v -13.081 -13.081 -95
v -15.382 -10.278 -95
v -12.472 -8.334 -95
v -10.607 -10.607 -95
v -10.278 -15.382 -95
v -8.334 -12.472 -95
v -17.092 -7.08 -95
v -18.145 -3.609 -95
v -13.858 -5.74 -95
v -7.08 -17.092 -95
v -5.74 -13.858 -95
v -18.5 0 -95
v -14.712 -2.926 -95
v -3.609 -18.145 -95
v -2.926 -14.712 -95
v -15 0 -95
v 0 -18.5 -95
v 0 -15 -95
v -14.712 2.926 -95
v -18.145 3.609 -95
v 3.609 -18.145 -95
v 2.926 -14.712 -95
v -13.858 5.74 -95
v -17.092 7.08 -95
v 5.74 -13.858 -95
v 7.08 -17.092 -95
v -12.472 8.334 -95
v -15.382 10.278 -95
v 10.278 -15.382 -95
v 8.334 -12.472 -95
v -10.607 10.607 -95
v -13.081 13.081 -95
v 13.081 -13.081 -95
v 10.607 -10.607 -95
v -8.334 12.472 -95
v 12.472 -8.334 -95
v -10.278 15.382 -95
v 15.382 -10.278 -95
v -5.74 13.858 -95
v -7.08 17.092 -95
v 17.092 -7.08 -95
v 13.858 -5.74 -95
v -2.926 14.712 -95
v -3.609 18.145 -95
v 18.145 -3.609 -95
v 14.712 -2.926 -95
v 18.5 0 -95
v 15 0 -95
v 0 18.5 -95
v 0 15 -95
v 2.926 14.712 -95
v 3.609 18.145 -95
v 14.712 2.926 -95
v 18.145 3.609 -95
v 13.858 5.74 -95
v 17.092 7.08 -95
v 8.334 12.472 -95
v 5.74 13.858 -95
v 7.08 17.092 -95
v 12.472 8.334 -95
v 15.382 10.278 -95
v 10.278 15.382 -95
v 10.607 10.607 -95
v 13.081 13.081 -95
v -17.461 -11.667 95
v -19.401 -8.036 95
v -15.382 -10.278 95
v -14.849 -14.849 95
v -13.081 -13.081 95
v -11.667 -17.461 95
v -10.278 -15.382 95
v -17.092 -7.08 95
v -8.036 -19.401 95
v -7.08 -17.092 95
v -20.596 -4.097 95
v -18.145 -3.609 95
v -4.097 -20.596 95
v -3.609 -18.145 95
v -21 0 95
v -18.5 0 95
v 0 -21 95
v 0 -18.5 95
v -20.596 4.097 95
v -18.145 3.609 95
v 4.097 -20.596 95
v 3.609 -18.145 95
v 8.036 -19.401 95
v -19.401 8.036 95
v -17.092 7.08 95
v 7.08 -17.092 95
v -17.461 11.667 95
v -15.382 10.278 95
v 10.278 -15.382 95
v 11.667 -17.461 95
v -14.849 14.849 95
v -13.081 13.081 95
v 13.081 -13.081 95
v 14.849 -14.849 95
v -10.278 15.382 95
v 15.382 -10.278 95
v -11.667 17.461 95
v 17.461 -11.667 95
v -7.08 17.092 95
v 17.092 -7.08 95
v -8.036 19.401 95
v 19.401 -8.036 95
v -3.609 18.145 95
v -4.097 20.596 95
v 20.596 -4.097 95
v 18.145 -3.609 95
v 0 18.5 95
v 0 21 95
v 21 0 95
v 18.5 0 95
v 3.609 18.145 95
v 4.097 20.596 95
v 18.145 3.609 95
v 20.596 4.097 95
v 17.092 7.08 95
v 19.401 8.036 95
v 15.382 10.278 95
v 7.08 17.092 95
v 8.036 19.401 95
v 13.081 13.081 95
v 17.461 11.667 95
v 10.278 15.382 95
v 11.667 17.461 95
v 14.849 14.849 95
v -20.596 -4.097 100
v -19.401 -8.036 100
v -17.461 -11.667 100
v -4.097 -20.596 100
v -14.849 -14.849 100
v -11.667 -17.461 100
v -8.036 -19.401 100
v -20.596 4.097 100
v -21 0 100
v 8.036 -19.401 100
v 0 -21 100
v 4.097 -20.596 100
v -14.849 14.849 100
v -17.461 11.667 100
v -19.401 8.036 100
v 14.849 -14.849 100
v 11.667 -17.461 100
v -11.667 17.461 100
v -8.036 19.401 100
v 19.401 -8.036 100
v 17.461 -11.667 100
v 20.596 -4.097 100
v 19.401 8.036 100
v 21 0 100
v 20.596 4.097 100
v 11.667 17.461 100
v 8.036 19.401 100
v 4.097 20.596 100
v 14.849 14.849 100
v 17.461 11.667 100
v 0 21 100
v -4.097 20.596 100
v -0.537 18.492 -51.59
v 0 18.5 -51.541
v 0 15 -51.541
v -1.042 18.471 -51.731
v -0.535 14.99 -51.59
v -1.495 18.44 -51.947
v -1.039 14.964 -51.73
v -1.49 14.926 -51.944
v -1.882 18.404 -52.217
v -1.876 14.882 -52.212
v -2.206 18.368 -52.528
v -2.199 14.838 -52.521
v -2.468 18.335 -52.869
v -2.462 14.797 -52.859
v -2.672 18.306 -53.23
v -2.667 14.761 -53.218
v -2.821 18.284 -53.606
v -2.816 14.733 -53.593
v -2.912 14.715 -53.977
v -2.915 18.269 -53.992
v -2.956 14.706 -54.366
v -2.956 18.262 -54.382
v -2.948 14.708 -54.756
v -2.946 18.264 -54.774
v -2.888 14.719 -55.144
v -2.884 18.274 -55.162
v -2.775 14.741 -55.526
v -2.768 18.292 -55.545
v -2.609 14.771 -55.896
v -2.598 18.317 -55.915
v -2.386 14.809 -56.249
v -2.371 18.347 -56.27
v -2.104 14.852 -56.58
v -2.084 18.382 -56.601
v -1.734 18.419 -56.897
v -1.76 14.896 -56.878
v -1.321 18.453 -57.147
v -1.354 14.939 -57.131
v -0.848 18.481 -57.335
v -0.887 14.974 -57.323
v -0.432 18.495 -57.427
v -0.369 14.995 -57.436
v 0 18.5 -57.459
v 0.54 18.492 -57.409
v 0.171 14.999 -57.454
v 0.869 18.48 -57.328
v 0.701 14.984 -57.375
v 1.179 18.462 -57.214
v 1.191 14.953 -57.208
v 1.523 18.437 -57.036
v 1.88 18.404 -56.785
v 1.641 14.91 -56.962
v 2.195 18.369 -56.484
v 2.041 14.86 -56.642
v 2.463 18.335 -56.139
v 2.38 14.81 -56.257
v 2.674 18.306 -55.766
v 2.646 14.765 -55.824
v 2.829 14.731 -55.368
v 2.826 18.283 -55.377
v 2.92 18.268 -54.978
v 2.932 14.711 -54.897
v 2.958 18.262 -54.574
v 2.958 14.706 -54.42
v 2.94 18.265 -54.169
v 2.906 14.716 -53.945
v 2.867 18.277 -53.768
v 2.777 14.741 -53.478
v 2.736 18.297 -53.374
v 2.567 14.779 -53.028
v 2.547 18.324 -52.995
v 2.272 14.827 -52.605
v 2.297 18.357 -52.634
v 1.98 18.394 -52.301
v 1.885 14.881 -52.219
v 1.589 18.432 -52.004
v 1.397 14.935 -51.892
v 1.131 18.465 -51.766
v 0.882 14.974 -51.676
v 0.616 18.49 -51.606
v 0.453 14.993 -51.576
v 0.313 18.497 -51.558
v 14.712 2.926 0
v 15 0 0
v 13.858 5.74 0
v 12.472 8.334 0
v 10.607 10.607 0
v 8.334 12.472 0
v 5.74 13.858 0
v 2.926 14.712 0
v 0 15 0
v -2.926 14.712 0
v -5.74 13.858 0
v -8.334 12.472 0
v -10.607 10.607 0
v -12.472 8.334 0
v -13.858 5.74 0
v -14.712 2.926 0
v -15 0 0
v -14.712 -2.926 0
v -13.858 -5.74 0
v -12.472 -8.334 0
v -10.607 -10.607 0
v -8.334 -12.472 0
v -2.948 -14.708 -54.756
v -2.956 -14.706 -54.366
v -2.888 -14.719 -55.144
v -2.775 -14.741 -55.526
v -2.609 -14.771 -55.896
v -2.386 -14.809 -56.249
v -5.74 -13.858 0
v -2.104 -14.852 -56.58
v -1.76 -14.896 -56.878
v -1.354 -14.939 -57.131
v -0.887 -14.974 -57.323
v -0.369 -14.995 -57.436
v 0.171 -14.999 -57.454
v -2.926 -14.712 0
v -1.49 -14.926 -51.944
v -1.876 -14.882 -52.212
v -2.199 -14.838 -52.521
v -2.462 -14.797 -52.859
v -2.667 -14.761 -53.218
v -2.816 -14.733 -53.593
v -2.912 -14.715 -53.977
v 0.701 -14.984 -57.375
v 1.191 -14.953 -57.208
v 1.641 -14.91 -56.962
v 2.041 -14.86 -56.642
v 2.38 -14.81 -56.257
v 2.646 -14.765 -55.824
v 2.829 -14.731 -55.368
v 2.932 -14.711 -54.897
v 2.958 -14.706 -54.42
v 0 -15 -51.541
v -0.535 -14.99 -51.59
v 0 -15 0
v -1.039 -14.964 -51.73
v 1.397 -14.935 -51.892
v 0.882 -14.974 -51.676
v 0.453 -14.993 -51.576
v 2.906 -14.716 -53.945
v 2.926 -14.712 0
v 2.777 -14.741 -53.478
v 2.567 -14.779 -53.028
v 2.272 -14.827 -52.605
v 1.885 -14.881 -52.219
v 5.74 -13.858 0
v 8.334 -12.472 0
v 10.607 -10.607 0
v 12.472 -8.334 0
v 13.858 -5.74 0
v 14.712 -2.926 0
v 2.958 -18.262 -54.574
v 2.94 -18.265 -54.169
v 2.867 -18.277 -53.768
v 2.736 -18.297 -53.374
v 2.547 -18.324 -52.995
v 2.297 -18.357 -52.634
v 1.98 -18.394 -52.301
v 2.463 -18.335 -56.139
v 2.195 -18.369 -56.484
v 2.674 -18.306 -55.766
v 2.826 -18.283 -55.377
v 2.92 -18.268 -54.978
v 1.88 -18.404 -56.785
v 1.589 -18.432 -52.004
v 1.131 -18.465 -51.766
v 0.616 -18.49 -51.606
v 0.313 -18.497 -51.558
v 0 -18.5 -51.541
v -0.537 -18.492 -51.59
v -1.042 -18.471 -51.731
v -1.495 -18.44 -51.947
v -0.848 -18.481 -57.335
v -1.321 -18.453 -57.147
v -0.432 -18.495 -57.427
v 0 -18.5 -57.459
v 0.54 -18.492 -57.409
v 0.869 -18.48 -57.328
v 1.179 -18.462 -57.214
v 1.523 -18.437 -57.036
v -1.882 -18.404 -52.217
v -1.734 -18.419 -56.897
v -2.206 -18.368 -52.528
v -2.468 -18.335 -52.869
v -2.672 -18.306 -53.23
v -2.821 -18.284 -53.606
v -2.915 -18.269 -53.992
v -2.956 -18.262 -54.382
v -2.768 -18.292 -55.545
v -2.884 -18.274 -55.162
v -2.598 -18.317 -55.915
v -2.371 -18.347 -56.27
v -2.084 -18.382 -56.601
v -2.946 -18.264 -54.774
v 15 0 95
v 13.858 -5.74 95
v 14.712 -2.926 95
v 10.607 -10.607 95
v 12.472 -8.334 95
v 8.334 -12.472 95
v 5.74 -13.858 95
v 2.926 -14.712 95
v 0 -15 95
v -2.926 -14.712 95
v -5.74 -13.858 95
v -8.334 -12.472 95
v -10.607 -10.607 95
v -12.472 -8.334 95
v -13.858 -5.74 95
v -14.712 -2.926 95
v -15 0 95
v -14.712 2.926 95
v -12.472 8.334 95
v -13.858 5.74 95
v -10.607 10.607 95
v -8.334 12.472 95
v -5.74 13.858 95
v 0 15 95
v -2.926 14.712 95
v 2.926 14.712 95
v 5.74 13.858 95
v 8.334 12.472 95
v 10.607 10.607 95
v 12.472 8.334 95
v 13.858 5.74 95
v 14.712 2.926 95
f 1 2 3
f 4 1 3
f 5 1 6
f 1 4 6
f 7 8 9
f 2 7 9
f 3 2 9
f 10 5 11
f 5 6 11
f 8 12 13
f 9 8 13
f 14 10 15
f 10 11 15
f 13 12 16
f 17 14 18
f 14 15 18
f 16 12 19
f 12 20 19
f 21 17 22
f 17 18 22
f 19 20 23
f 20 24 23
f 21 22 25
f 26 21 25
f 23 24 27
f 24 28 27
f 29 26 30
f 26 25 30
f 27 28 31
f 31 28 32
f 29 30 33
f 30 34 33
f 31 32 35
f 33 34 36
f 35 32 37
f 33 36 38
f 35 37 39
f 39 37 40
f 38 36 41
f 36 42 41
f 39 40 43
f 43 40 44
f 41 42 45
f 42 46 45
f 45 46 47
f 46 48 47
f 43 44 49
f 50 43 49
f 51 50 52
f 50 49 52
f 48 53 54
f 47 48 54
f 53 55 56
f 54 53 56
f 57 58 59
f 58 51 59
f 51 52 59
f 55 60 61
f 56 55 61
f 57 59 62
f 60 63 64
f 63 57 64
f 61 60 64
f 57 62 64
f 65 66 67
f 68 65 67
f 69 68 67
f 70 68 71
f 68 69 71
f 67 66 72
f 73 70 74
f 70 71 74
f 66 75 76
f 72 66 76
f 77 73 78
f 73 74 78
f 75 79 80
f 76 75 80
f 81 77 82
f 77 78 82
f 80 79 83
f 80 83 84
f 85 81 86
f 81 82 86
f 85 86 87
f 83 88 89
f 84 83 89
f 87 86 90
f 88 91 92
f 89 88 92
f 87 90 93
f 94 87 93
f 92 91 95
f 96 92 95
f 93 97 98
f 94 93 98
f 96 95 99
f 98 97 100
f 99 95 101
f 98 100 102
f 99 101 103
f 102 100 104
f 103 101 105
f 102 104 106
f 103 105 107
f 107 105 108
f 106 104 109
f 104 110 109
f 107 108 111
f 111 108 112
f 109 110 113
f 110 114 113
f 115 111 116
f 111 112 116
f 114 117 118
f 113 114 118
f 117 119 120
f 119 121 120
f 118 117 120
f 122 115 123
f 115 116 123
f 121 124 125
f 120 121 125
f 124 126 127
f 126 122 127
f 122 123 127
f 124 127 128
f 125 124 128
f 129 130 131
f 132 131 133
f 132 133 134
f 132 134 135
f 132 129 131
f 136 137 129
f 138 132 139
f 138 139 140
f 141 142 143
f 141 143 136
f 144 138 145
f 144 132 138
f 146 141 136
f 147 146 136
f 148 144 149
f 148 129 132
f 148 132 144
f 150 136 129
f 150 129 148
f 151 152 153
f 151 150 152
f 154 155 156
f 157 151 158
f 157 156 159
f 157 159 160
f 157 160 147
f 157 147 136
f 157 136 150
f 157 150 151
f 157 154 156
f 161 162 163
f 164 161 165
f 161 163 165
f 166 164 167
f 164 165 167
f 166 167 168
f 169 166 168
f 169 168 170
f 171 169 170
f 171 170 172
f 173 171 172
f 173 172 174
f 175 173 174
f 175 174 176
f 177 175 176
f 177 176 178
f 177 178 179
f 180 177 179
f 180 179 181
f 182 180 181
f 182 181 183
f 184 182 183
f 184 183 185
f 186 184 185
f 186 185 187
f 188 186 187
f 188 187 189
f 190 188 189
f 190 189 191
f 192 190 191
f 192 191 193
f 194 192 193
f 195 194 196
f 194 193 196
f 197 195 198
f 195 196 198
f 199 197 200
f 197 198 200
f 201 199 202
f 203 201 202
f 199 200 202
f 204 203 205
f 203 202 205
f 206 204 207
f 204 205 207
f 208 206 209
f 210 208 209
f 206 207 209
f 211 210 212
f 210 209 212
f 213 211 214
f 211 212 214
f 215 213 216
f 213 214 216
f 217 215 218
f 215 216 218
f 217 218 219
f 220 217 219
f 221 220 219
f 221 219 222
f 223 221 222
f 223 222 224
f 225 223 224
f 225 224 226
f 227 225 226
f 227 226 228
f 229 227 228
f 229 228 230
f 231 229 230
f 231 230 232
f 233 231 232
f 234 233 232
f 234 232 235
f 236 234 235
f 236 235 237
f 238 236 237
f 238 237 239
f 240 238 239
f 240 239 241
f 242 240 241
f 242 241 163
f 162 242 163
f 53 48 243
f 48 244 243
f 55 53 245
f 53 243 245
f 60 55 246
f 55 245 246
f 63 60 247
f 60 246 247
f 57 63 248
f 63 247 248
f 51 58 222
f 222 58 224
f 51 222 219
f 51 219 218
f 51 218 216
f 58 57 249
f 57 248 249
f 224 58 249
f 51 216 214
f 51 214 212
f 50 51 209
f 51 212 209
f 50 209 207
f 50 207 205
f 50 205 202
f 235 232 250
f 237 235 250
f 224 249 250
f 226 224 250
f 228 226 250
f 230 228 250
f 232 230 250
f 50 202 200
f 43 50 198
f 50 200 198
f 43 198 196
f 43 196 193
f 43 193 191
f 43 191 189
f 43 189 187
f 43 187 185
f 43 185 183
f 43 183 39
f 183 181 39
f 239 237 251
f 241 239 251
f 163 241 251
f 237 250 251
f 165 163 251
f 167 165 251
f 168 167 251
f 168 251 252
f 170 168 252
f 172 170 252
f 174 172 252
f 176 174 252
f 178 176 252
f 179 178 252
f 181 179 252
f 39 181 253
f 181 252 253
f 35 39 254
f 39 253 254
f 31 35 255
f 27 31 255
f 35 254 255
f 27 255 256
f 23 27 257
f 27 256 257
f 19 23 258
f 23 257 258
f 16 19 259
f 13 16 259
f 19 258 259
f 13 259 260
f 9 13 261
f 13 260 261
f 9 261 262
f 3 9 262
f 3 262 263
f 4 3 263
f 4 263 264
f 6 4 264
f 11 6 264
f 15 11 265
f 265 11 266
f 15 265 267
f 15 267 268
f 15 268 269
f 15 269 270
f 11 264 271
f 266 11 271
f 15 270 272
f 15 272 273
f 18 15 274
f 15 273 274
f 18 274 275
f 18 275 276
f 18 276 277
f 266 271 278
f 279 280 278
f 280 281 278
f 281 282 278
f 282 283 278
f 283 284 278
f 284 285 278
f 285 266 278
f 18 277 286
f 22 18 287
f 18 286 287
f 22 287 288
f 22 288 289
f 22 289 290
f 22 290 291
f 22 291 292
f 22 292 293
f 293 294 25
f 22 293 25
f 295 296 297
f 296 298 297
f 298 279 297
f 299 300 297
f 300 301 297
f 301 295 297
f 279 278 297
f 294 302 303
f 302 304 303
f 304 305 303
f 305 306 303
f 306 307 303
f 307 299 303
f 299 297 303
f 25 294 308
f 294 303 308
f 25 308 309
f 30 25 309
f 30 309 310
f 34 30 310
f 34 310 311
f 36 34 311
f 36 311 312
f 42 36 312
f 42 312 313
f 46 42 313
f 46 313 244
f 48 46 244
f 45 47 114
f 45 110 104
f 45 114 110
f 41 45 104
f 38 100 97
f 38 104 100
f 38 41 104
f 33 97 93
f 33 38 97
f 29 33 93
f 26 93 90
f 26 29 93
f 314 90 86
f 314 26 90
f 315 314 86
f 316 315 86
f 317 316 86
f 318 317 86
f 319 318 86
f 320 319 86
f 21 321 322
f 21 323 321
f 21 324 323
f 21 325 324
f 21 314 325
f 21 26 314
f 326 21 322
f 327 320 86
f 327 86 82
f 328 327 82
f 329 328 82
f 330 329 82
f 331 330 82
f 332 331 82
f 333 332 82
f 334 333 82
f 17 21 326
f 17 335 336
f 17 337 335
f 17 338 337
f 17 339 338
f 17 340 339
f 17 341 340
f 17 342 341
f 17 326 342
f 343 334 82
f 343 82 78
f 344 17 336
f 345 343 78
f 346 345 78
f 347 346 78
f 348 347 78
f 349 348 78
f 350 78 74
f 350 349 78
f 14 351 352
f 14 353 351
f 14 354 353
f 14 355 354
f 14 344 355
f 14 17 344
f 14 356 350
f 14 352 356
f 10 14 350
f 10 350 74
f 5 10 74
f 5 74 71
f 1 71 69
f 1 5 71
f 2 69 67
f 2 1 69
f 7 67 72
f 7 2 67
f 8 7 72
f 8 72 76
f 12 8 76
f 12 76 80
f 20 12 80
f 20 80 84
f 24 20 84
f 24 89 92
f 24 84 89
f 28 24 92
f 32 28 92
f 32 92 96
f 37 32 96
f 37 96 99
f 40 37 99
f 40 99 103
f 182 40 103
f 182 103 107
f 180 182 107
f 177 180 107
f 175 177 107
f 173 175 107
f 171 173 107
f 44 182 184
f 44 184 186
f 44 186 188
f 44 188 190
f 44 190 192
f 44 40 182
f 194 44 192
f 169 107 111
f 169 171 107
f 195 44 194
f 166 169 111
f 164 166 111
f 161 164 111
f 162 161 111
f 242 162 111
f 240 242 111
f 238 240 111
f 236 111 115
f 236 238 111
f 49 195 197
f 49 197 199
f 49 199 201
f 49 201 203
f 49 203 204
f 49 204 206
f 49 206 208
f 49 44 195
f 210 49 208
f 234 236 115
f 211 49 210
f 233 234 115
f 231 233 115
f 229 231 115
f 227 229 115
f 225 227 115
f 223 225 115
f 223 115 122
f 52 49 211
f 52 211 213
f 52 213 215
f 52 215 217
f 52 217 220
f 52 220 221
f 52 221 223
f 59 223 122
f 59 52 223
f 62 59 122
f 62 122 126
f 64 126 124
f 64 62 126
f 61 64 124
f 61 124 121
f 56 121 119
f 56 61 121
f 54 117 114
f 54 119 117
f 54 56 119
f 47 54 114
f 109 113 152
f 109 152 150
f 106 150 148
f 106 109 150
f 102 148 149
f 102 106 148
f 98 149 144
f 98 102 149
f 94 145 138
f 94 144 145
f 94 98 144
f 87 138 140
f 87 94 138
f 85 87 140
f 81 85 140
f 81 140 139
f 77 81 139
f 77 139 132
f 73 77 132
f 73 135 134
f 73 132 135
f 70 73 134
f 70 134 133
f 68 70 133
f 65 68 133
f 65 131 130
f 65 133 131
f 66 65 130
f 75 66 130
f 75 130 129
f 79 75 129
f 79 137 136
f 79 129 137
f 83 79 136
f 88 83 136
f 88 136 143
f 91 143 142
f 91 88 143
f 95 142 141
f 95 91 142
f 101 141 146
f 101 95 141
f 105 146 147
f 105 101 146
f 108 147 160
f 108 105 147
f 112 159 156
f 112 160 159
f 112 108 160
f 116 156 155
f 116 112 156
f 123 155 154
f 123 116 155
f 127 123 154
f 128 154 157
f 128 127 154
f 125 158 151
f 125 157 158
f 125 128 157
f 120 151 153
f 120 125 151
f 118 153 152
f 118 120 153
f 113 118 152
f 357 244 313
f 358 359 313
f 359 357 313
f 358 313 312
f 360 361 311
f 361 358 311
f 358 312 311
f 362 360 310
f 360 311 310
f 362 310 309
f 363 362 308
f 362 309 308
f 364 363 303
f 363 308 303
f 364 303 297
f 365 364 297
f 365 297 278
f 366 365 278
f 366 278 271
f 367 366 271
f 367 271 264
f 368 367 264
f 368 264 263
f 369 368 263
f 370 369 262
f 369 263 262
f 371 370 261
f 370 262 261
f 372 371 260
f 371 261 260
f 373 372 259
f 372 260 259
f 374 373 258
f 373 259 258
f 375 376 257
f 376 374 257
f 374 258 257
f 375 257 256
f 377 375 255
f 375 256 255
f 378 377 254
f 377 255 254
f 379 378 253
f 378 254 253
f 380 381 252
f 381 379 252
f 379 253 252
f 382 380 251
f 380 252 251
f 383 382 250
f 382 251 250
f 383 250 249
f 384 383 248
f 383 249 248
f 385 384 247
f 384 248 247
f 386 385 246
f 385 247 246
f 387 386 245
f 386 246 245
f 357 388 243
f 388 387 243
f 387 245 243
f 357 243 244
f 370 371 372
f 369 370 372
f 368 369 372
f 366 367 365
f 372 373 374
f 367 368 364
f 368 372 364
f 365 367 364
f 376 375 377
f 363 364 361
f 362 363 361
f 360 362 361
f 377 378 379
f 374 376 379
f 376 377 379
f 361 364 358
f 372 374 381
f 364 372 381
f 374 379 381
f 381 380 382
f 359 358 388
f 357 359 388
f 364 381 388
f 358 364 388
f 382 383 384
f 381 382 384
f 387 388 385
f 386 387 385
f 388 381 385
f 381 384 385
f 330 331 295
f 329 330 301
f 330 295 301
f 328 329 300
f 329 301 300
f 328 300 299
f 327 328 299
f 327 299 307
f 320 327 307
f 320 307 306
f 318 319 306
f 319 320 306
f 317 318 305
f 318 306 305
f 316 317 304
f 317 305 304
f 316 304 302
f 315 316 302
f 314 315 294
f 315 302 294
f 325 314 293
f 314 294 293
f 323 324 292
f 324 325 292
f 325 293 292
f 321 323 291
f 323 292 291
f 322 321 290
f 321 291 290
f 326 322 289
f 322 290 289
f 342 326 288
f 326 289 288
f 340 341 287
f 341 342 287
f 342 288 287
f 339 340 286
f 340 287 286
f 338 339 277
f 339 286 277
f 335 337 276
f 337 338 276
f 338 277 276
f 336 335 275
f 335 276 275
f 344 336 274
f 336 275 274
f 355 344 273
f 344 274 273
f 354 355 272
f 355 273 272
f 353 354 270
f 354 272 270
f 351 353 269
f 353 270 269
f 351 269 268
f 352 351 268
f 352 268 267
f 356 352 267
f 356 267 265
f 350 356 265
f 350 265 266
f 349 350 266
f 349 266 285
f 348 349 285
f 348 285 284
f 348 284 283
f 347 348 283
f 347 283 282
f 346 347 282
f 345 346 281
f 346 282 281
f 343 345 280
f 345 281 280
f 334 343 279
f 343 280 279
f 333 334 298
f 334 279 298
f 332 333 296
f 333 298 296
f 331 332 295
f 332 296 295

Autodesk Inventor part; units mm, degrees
ref_plane "YZ Plane" through (0, 0, 0) normal (1, 0, 0) x (0, 1, 0)
ref_plane "XZ Plane" through (0, 0, 0) normal (0, 1, 0) x (-1, 0, 0)
sketch "Sketch1" plane through (0, 0, 0) normal (0, 0, 1) x (1, 0, 0)
  circle A0 centre (0, 0) radius 18.5
  circle A1 centre (0, 0) radius 15
  dimension "d0" = 37
  dimension "d1" = 30
extrude "Extrusion1" add sketch "Sketch1" along normal mid plane 190
ref_plane "Work Plane4" through (0, 18.5, 0) normal (0, 1, 0) x (-1, 0, 0)
sketch "Sketch4" plane through (0, 18.5, 0) normal (0, 1, 0) x (-1, 0, 0)
  line L0 (-18.5, -95) -> (18.5, -95) projected
  line L1 (18.5, -95) -> (18.5, 95) projected
  line L2 (-18.5, -95) -> (18.5, -95) projected
  line L3 (18.5, 95) -> (-18.5, 95) projected
  point P0 (0, 0)
  point P1 (0, -54.5)
  dimension "d14" = 40.5
  dimension "d22" = 190
  dimension "d23" = 18.5
hole "Hole1" at (0, 18.5, -54.5) direction (0, -1, 0) diameter 5.9175 depth 19.1 tip angle 118 thread size "M7x1" class "6H" standard "ISO Metric profile"
mirror "Mirror2" about plane through (0, 0, 0) normal (0, 1, 0) of "Hole1"
sketch "Sketch5" plane through (0, 0, 95) normal (0, 0, 1) x (1, 0, 0)
  circle A0 centre (0, 0) radius 21
  dimension "d24" = 42
extrude "Extrusion3" add sketch "Sketch5" along normal blind 5
properties part number "EjeRodilla"
